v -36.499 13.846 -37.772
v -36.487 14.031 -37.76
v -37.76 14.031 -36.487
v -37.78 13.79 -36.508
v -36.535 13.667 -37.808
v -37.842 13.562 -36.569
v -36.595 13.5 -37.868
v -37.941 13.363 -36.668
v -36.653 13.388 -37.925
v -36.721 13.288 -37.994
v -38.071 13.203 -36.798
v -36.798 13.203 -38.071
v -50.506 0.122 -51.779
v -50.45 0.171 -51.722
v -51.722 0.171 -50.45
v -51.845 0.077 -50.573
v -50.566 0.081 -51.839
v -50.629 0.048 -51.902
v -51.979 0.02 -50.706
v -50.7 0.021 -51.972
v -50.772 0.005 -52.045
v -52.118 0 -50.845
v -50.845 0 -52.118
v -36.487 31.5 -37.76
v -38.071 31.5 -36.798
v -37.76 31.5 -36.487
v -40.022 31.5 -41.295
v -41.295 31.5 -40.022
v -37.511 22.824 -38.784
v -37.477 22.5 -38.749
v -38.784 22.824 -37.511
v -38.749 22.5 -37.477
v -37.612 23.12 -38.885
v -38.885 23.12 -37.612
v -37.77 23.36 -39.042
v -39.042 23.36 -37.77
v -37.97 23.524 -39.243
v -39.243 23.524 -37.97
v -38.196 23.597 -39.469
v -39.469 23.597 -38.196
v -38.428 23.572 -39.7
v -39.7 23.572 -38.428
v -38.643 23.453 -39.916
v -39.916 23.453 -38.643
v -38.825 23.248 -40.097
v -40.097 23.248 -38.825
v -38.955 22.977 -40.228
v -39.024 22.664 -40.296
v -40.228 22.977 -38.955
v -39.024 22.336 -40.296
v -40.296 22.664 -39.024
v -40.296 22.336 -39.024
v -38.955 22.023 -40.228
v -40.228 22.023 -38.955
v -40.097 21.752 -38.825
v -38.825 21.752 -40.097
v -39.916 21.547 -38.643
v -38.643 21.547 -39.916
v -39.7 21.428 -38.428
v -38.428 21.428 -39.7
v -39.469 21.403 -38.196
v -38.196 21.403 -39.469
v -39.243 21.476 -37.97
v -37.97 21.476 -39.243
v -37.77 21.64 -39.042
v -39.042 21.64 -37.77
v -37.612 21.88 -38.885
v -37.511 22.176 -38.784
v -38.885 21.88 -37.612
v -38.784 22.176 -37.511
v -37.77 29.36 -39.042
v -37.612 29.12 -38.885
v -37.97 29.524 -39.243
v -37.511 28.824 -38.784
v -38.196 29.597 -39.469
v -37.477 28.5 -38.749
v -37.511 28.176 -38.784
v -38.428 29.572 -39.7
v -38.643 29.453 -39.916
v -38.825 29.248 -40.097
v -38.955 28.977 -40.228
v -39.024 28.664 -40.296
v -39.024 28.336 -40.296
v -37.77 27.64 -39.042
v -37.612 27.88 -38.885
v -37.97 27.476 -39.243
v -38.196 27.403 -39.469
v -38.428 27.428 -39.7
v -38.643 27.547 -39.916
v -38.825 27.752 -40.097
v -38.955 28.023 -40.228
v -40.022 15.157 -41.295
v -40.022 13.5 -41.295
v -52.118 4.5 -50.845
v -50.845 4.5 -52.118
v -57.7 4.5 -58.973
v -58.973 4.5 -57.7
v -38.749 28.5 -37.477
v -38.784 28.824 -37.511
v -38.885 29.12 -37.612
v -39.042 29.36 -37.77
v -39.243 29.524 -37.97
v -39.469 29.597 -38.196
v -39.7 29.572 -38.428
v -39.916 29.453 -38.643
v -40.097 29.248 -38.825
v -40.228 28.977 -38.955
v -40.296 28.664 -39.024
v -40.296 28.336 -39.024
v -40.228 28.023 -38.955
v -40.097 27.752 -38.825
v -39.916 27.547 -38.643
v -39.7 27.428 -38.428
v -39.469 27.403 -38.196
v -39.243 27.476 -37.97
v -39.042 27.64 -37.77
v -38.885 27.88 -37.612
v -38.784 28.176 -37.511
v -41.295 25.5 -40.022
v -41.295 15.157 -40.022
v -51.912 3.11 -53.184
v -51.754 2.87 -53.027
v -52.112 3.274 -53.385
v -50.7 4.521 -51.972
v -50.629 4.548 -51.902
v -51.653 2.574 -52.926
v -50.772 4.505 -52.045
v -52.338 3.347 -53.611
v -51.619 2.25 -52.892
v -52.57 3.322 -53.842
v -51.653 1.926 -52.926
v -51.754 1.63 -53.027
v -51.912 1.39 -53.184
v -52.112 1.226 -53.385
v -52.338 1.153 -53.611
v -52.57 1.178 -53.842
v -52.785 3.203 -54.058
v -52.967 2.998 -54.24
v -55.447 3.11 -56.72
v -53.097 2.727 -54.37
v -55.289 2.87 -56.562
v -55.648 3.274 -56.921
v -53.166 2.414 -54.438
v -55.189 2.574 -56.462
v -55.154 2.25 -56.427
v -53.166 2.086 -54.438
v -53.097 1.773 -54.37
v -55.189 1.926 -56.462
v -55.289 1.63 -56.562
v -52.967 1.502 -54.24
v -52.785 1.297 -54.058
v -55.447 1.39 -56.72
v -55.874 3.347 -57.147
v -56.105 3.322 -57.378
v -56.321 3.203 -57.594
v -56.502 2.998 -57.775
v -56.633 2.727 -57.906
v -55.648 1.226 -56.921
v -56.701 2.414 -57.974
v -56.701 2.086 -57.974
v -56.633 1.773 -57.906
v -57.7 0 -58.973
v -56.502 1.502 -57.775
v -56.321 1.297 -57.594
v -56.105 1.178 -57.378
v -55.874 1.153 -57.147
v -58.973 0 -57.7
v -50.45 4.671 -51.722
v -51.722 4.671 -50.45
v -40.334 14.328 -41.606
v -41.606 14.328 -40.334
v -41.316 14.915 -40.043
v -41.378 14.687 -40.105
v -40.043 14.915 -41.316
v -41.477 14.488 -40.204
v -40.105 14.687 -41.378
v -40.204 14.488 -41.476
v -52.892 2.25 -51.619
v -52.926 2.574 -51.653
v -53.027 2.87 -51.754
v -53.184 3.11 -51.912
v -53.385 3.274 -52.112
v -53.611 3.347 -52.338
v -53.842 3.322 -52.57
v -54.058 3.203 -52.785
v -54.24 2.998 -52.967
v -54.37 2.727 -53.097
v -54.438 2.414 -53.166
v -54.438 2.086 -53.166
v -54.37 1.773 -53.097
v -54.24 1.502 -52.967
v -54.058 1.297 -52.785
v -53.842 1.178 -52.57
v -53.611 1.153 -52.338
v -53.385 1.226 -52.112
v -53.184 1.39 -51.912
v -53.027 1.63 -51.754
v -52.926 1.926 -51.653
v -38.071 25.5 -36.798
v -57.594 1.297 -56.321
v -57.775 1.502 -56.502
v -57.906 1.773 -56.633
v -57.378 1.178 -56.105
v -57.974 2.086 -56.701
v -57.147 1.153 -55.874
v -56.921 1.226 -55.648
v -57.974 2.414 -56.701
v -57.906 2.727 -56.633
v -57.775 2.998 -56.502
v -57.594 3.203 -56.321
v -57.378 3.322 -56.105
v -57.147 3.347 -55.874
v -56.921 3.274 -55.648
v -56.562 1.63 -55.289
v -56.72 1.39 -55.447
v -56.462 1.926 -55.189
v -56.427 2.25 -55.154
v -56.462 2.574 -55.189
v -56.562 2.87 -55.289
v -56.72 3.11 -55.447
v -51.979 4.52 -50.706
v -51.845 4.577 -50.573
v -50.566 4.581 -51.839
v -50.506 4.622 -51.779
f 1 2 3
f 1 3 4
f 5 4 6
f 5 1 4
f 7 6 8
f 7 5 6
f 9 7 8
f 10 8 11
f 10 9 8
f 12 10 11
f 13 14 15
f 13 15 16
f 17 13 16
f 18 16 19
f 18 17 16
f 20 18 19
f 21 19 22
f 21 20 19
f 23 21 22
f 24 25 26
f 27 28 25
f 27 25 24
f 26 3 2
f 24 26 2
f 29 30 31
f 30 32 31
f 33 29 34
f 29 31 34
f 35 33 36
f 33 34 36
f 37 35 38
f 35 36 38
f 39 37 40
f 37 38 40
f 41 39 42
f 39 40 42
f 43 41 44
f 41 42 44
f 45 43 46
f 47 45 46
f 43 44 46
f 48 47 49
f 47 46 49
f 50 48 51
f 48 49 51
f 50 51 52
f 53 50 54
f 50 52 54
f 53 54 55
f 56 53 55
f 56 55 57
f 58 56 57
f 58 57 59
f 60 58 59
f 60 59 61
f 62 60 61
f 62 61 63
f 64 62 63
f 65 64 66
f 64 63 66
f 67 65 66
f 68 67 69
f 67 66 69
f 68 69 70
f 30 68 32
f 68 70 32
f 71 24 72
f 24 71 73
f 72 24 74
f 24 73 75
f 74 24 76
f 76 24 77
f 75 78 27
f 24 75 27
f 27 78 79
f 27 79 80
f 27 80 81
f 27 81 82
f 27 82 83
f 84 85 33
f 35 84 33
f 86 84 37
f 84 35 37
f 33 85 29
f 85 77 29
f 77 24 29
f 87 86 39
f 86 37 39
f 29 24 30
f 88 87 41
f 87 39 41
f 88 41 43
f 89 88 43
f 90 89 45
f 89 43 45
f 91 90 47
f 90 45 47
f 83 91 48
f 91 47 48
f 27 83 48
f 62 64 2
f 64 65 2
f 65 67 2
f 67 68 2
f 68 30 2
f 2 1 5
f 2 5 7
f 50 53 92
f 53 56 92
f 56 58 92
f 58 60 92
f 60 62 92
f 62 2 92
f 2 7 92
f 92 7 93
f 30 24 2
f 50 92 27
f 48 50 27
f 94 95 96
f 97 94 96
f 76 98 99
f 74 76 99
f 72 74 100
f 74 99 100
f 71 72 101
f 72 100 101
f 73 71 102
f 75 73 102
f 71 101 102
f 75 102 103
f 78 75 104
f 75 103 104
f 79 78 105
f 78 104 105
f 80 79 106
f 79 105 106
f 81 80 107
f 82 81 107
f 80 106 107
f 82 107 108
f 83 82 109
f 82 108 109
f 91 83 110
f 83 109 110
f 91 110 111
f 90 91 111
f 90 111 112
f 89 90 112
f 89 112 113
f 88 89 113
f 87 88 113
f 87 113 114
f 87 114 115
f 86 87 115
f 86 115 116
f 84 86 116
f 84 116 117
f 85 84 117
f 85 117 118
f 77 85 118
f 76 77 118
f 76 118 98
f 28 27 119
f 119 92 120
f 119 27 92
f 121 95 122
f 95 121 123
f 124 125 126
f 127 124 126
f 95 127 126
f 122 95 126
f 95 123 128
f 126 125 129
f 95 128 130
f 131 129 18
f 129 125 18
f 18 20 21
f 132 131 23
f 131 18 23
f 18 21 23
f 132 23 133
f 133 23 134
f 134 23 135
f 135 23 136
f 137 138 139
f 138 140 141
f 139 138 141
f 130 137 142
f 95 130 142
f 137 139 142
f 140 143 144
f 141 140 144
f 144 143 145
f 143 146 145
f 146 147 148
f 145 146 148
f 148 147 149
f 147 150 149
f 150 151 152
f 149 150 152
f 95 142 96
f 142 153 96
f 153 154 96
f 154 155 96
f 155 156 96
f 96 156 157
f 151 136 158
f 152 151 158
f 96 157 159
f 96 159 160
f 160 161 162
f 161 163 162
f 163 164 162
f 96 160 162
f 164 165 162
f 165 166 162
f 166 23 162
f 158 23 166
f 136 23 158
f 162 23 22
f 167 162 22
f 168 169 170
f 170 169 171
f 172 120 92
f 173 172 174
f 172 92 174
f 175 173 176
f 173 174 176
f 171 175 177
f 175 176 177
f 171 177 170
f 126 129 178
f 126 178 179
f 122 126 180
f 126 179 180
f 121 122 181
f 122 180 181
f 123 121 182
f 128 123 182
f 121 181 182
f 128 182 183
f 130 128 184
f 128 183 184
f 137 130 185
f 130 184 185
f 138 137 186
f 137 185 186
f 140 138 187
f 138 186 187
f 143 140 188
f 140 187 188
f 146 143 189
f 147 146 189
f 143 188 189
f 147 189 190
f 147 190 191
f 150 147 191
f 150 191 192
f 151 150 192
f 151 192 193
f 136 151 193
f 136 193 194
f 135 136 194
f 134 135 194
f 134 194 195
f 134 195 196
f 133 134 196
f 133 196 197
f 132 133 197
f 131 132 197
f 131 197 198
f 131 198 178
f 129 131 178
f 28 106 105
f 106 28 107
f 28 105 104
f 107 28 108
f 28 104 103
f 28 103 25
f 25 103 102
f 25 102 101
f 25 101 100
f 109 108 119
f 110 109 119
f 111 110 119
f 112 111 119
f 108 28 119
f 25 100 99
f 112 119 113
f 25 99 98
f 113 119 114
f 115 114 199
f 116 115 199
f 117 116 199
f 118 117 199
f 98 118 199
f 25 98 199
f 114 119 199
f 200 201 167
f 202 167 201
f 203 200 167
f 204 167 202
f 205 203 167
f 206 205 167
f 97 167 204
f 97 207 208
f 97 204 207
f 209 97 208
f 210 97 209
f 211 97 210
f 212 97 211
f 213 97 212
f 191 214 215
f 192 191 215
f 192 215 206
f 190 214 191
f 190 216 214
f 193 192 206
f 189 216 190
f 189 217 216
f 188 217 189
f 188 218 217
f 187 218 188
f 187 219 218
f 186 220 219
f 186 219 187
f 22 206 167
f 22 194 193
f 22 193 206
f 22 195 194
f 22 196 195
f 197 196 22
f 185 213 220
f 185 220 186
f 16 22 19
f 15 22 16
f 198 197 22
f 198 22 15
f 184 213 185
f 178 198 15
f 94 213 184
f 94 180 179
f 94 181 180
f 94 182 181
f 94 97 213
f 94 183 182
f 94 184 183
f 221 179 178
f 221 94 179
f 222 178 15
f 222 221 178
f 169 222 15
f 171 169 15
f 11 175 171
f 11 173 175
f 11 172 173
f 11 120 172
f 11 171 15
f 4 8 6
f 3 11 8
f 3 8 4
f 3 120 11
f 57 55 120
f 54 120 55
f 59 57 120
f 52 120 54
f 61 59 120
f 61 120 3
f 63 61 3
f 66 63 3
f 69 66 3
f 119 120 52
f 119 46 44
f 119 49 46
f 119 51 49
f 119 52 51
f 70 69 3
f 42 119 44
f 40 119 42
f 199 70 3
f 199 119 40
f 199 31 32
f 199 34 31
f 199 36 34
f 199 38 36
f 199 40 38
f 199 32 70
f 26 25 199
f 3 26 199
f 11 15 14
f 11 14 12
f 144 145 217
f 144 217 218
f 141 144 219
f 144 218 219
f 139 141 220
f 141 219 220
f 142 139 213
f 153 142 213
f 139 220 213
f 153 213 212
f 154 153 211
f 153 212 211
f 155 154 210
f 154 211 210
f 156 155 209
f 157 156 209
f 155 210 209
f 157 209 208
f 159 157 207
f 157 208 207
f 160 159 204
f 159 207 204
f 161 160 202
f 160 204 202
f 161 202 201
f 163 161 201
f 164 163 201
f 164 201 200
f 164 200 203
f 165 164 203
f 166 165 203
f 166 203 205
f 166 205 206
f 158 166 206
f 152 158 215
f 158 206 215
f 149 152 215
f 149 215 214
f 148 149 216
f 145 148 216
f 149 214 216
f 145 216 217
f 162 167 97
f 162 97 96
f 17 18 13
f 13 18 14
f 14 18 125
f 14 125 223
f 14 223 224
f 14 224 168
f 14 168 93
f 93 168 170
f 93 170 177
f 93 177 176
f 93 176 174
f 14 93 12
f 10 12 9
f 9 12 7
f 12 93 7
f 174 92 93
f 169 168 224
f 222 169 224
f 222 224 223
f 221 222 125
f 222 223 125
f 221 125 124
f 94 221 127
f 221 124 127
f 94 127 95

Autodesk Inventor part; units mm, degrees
ref_plane "YZ Plane" through (0, 0, 0) normal (1, 0, 0) x (0, 1, 0)
sketch "Sketch3" plane through (0, 0, 0) normal (0, 1, 0) x (-1, 0, 0)
  circle A0 centre (0, 0) radius 110 construction
  arc A1 (43.0581, -98.5) -> (-43.0581, -98.5) centre (0, 0) ccw
  line L0 (0, -107.5) -> (0, -98.5) construction
  line L1 (0, -98.5) -> (0, -73.5) construction
  line L2 (0, -98.5) -> (-43.0581, -98.5) construction
  line L3 (0, -98.5) -> (43.0581, -98.5) construction
  line L4 (43.0581, -98.5) -> (-43.0581, -98.5) construction
  line L5 (-18.0581, -73.5) -> (18.0581, -73.5)
  arc A2 (43.0581, -98.5) -> (18.0581, -73.5) centre (18.0581, -98.5) ccw
  arc A3 (-18.0581, -73.5) -> (-43.0581, -98.5) centre (-18.0581, -98.5) ccw
  line L6 (0, 107.5) -> (0, 97.5) construction
  line L7 (0, 97.5) -> (-22.5, 97.5) construction
  line L8 (-22.5, 97.5) -> (-22.5, 82.5) construction
  line L9 (22.5, 82.5) -> (22.5, 97.5) construction
  line L10 (22.5, 90) -> (-22.5, 90) construction
  line L11 (15, 97.5) -> (-15, 97.5)
  line L12 (-15, 82.5) -> (15, 82.5)
  arc A4 (15, 82.5) -> (15, 97.5) centre (15, 90) ccw
  arc A5 (-15, 97.5) -> (-15, 82.5) centre (-15, 90) ccw
  line L13 (22.5, 82.5) -> (17.5, 82.5) construction
  line L14 (17.5, 82.5) -> (17.5, 77.5) construction
  circle A6 centre (17.5, 77.5) radius 1.6
  circle A7 centre (-17.5, 77.5) radius 1.6
  line L15 (-58.3363, 79.5495) -> (-79.5495, 58.3363)
  arc A8 (-47.7297, 68.9429) -> (-58.3363, 79.5495) centre (-53.033, 74.2462) ccw
  arc A9 (-79.5495, 58.3363) -> (-68.9429, 47.7297) centre (-74.2462, 53.033) ccw
  line L16 (-68.9429, 47.7297) -> (-47.7297, 68.9429)
  circle A10 centre (-67.1751, 42.4264) radius 1.6
  circle A11 centre (-42.4264, 67.1751) radius 1.6
  line L17 (-97.5, 15) -> (-97.5, -15)
  arc A12 (-82.5, 15) -> (-97.5, 15) centre (-90, 15) ccw
  arc A13 (-97.5, -15) -> (-82.5, -15) centre (-90, -15) ccw
  line L18 (-82.5, -15) -> (-82.5, 15)
  circle A14 centre (-77.5, -17.5) radius 1.6
  circle A15 centre (-77.5, 17.5) radius 1.6
  line L19 (-79.5495, -58.3363) -> (-58.3363, -79.5495)
  arc A16 (-68.9429, -47.7297) -> (-79.5495, -58.3363) centre (-74.2462, -53.033) ccw
  arc A17 (-58.3363, -79.5495) -> (-47.7297, -68.9429) centre (-53.033, -74.2462) ccw
  line L20 (-47.7297, -68.9429) -> (-68.9429, -47.7297)
  circle A18 centre (-42.4264, -67.1751) radius 1.6
  circle A19 centre (-67.1751, -42.4264) radius 1.6
  line L21 (-15, -97.5) -> (15, -97.5)
  arc A20 (-15, -82.5) -> (-15, -97.5) centre (-15, -90) ccw
  arc A21 (15, -97.5) -> (15, -82.5) centre (15, -90) ccw
  line L22 (15, -82.5) -> (-15, -82.5)
  circle A22 centre (17.5, -77.5) radius 1.6
  circle A23 centre (-17.5, -77.5) radius 1.6
  line L23 (58.3363, -79.5495) -> (79.5495, -58.3363)
  arc A24 (47.7297, -68.9429) -> (58.3363, -79.5495) centre (53.033, -74.2462) ccw
  arc A25 (79.5495, -58.3363) -> (68.9429, -47.7297) centre (74.2462, -53.033) ccw
  line L24 (68.9429, -47.7297) -> (47.7297, -68.9429)
  circle A26 centre (67.1751, -42.4264) radius 1.6
  circle A27 centre (42.4264, -67.1751) radius 1.6
  line L25 (97.5, -15) -> (97.5, 15)
  arc A28 (82.5, -15) -> (97.5, -15) centre (90, -15) ccw
  arc A29 (97.5, 15) -> (82.5, 15) centre (90, 15) ccw
  line L26 (82.5, 15) -> (82.5, -15)
  circle A30 centre (77.5, 17.5) radius 1.6
  circle A31 centre (77.5, -17.5) radius 1.6
  line L27 (79.5495, 58.3363) -> (58.3363, 79.5495)
  arc A32 (68.9429, 47.7297) -> (79.5495, 58.3363) centre (74.2462, 53.033) ccw
  arc A33 (58.3363, 79.5495) -> (47.7297, 68.9429) centre (53.033, 74.2462) ccw
  line L28 (47.7297, 68.9429) -> (68.9429, 47.7297)
  circle A34 centre (42.4264, 67.1751) radius 1.6
  circle A35 centre (67.1751, 42.4264) radius 1.6
  circle A36 centre (0, 0) radius 110 construction
  arc A37 (43.0581, -98.5) -> (-43.0581, -98.5) centre (0, 0) ccw
  line L29 (0, -107.5) -> (0, -98.5) construction
  line L30 (0, -98.5) -> (0, -73.5) construction
  line L31 (0, -98.5) -> (-43.0581, -98.5) construction
  line L32 (0, -98.5) -> (43.0581, -98.5) construction
  line L33 (43.0581, -98.5) -> (-43.0581, -98.5) construction
  line L34 (-18.0581, -73.5) -> (18.0581, -73.5)
  arc A38 (43.0581, -98.5) -> (18.0581, -73.5) centre (18.0581, -98.5) ccw
  arc A39 (-18.0581, -73.5) -> (-43.0581, -98.5) centre (-18.0581, -98.5) ccw
  line L35 (0, 107.5) -> (0, 97.5) construction
  line L36 (0, 97.5) -> (-22.5, 97.5) construction
  line L37 (-22.5, 97.5) -> (-22.5, 82.5) construction
  line L38 (22.5, 82.5) -> (22.5, 97.5) construction
  line L39 (22.5, 90) -> (-22.5, 90) construction
  line L40 (15, 97.5) -> (-15, 97.5)
  line L41 (-15, 82.5) -> (15, 82.5)
  arc A40 (15, 82.5) -> (15, 97.5) centre (15, 90) ccw
  arc A41 (-15, 97.5) -> (-15, 82.5) centre (-15, 90) ccw
  line L42 (22.5, 82.5) -> (17.5, 82.5) construction
  line L43 (17.5, 82.5) -> (17.5, 77.5) construction
  circle A42 centre (17.5, 77.5) radius 1.6
  circle A43 centre (-17.5, 77.5) radius 1.6
  line L44 (-58.3363, 79.5495) -> (-79.5495, 58.3363)
  arc A44 (-47.7297, 68.9429) -> (-58.3363, 79.5495) centre (-53.033, 74.2462) ccw
  arc A45 (-79.5495, 58.3363) -> (-68.9429, 47.7297) centre (-74.2462, 53.033) ccw
  line L45 (-68.9429, 47.7297) -> (-47.7297, 68.9429)
  circle A46 centre (-67.1751, 42.4264) radius 1.6
  circle A47 centre (-42.4264, 67.1751) radius 1.6
  line L46 (-97.5, 15) -> (-97.5, -15)
  arc A48 (-82.5, 15) -> (-97.5, 15) centre (-90, 15) ccw
  arc A49 (-97.5, -15) -> (-82.5, -15) centre (-90, -15) ccw
  line L47 (-82.5, -15) -> (-82.5, 15)
  circle A50 centre (-77.5, -17.5) radius 1.6
  circle A51 centre (-77.5, 17.5) radius 1.6
  line L48 (-79.5495, -58.3363) -> (-58.3363, -79.5495)
  arc A52 (-68.9429, -47.7297) -> (-79.5495, -58.3363) centre (-74.2462, -53.033) ccw
  arc A53 (-58.3363, -79.5495) -> (-47.7297, -68.9429) centre (-53.033, -74.2462) ccw
  line L49 (-47.7297, -68.9429) -> (-68.9429, -47.7297)
  circle A54 centre (-42.4264, -67.1751) radius 1.6
  circle A55 centre (-67.1751, -42.4264) radius 1.6
  line L50 (-15, -97.5) -> (15, -97.5)
  arc A56 (-15, -82.5) -> (-15, -97.5) centre (-15, -90) ccw
  arc A57 (15, -97.5) -> (15, -82.5) centre (15, -90) ccw
  line L51 (15, -82.5) -> (-15, -82.5)
  circle A58 centre (17.5, -77.5) radius 1.6
  circle A59 centre (-17.5, -77.5) radius 1.6
  line L52 (58.3363, -79.5495) -> (79.5495, -58.3363)
  arc A60 (47.7297, -68.9429) -> (58.3363, -79.5495) centre (53.033, -74.2462) ccw
  arc A61 (79.5495, -58.3363) -> (68.9429, -47.7297) centre (74.2462, -53.033) ccw
  line L53 (68.9429, -47.7297) -> (47.7297, -68.9429)
  circle A62 centre (67.1751, -42.4264) radius 1.6
  circle A63 centre (42.4264, -67.1751) radius 1.6
  line L54 (97.5, -15) -> (97.5, 15)
  arc A64 (82.5, -15) -> (97.5, -15) centre (90, -15) ccw
  arc A65 (97.5, 15) -> (82.5, 15) centre (90, 15) ccw
  line L55 (82.5, 15) -> (82.5, -15)
  circle A66 centre (77.5, 17.5) radius 1.6
  circle A67 centre (77.5, -17.5) radius 1.6
  line L56 (79.5495, 58.3363) -> (58.3363, 79.5495)
  arc A68 (68.9429, 47.7297) -> (79.5495, 58.3363) centre (74.2462, 53.033) ccw
  arc A69 (58.3363, 79.5495) -> (47.7297, 68.9429) centre (53.033, 74.2462) ccw
  line L57 (47.7297, 68.9429) -> (68.9429, 47.7297)
  circle A70 centre (42.4264, 67.1751) radius 1.6
  circle A71 centre (67.1751, 42.4264) radius 1.6
  line L58 (67.1751, -42.4264) -> (54.8008, -54.8008) construction
  line L59 (54.8008, -54.8008) -> (53.3866, -56.215) construction
  line L60 (53.3866, -56.215) -> (52.3259, -57.2756) construction
  line L61 (47.7297, -54.8008) -> (54.8008, -61.8718)
  line L62 (54.8008, -61.8718) -> (56.9221, -59.7505)
  line L63 (56.9221, -59.7505) -> (49.851, -52.6795)
  line L64 (49.851, -52.6795) -> (47.7297, -54.8008)
  line L65 (47.7297, -54.8008) -> (56.9221, -59.7505) construction
  line L66 (54.8008, -61.8718) -> (49.851, -52.6795) construction
  line L67 (54.8008, -54.8008) -> (53.7401, -53.7401) construction
  line L68 (59.7505, -56.9221) -> (52.6795, -49.851)
  line L69 (54.8008, -47.7297) -> (61.8718, -54.8008)
  line L70 (52.6795, -49.851) -> (54.8008, -47.7297)
  line L71 (58.9727, -57.6999) -> (51.9016, -50.6288)
  line L72 (51.9016, -50.6288) -> (50.6288, -51.9016)
  line L73 (50.6288, -51.9016) -> (57.6999, -58.9727)
  line L74 (57.6999, -58.9727) -> (58.9727, -57.6999)
  line L75 (58.9727, -57.6999) -> (50.6288, -51.9016) construction
  line L76 (51.9016, -50.6288) -> (57.6999, -58.9727) construction
  point P0 (0, 90)
  point P1 (-45.9619, 70.7107)
  point P2 (-82.5, 17.5)
  point P3 (-70.7107, -45.9619)
  point P4 (-17.5, -82.5)
  point P5 (45.9619, -70.7107)
  point P6 (82.5, -17.5)
  point P7 (70.7107, 45.9619)
  point P8 (0, 90)
  point P9 (-45.9619, 70.7107)
  point P10 (-82.5, 17.5)
  point P11 (-70.7107, -45.9619)
  point P12 (-17.5, -82.5)
  point P13 (45.9619, -70.7107)
  point P14 (82.5, -17.5)
  point P15 (70.7107, 45.9619)
  point P16 (45.4935, 0)
  point P17 (26.7551, 33.8262)
  point P18 (-26.7551, 33.8262)
  point P19 (-33.8262, 26.7551)
  point P20 (-33.8262, -26.7551)
  point P21 (-26.7551, -33.8262)
  point P22 (26.7551, -33.8262)
  point P23 (33.8262, -26.7551)
  point P24 (33.8262, 26.7551)
  dimension "d9" = 220
  dimension "d10" = 215
  dimension "d11" = 9
  dimension "d12" = 25
  dimension "d13" = 10
  dimension "d14" = 22.5
  dimension "d15" = 15
  dimension "d16" = 45
  dimension "d17" = 5
  dimension "d18" = 5
  dimension "d19" = 3.2
  dimension "d20" = 86.1162
  dimension "d21" = 45
  dimension "d22" = 360
  dimension "d23" = 220
  dimension "d24" = 215
  dimension "d25" = 9
  dimension "d26" = 25
  dimension "d27" = 10
  dimension "d28" = 22.5
  dimension "d29" = 15
  dimension "d30" = 45
  dimension "d31" = 5
  dimension "d32" = 5
  dimension "d33" = 3.2
  dimension "d34" = 86.1162
  dimension "d35" = 45
  dimension "d36" = 360
  dimension "d37" = 17.5
  dimension "d38" = 2
  dimension "d39" = 1.5
  dimension "d40" = 1.8
extrude "Extrusion2" add sketch "Sketch3" along normal blind 4.5 contours L73 L72 L71 L24
sketch "Sketch4" plane through (-51.9016, 0, -50.6288) normal (-0.7071068, 0, 0.7071068) x (0.7071068, 0, 0.7071068)
  line L0 (0, 4.5) -> (-10, 4.5) construction
  line L1 (0, 0) -> (-10, 0) construction
  line L2 (-10, 4.5) -> (0, 0) construction
  line L3 (-5, 2.25) -> (-7.5, 2.25) construction
  line L4 (-10, 0) -> (-10, 4.5) construction
  line L5 (-5, 2.25) -> (-5, 3.2445) construction
  circle A0 centre (-7.5, 2.25) radius 1.1
  circle A1 centre (-2.5, 2.25) radius 1.1
  point P0 (72.5, 0)
  dimension "d43" = 2.5
  dimension "d44" = 2.2
extrude "Extrusion3" cut sketch "Sketch4" against normal blind 4.5
ref_plane "Work Plane2" through (0, 19.5, 0) normal (0, 1, 0) x (1, 0, 0)
sketch "Sketch5" plane through (0, 19.5, 0) normal (0, 1, 0) x (1, 0, 0)
  circle A0 centre (0, 0) radius 110 construction
  arc A1 (43.0581, -98.5) -> (-43.0581, -98.5) centre (0, 0) ccw
  line L0 (0, -107.5) -> (0, -98.5) construction
  line L1 (0, -98.5) -> (0, -73.5) construction
  line L2 (0, -98.5) -> (-43.0581, -98.5) construction
  line L3 (0, -98.5) -> (43.0581, -98.5) construction
  line L4 (43.0581, -98.5) -> (-43.0581, -98.5) construction
  line L5 (-18.0581, -73.5) -> (18.0581, -73.5)
  arc A2 (43.0581, -98.5) -> (18.0581, -73.5) centre (18.0581, -98.5) ccw
  arc A3 (-18.0581, -73.5) -> (-43.0581, -98.5) centre (-18.0581, -98.5) ccw
  line L6 (0, 107.5) -> (0, 97.5) construction
  line L7 (0, 97.5) -> (-22.5, 97.5) construction
  line L8 (-22.5, 97.5) -> (-22.5, 82.5) construction
  line L9 (22.5, 82.5) -> (22.5, 97.5) construction
  line L10 (22.5, 90) -> (-22.5, 90) construction
  line L11 (15, 97.5) -> (-15, 97.5)
  line L12 (-15, 82.5) -> (15, 82.5)
  arc A4 (15, 82.5) -> (15, 97.5) centre (15, 90) ccw
  arc A5 (-15, 97.5) -> (-15, 82.5) centre (-15, 90) ccw
  line L13 (22.5, 82.5) -> (17.5, 82.5) construction
  line L14 (17.5, 82.5) -> (17.5, 77.5) construction
  circle A6 centre (17.5, 77.5) radius 1.6
  circle A7 centre (-17.5, 77.5) radius 1.6
  line L15 (-58.3363, 79.5495) -> (-79.5495, 58.3363)
  arc A8 (-47.7297, 68.9429) -> (-58.3363, 79.5495) centre (-53.033, 74.2462) ccw
  arc A9 (-79.5495, 58.3363) -> (-68.9429, 47.7297) centre (-74.2462, 53.033) ccw
  line L16 (-68.9429, 47.7297) -> (-47.7297, 68.9429)
  circle A10 centre (-67.1751, 42.4264) radius 1.6
  circle A11 centre (-42.4264, 67.1751) radius 1.6
  line L17 (-97.5, 15) -> (-97.5, -15)
  arc A12 (-82.5, 15) -> (-97.5, 15) centre (-90, 15) ccw
  arc A13 (-97.5, -15) -> (-82.5, -15) centre (-90, -15) ccw
  line L18 (-82.5, -15) -> (-82.5, 15)
  circle A14 centre (-77.5, -17.5) radius 1.6
  circle A15 centre (-77.5, 17.5) radius 1.6
  line L19 (-79.5495, -58.3363) -> (-58.3363, -79.5495)
  arc A16 (-68.9429, -47.7297) -> (-79.5495, -58.3363) centre (-74.2462, -53.033) ccw
  arc A17 (-58.3363, -79.5495) -> (-47.7297, -68.9429) centre (-53.033, -74.2462) ccw
  line L20 (-47.7297, -68.9429) -> (-68.9429, -47.7297)
  circle A18 centre (-42.4264, -67.1751) radius 1.6
  circle A19 centre (-67.1751, -42.4264) radius 1.6
  line L21 (-15, -97.5) -> (15, -97.5)
  arc A20 (-15, -82.5) -> (-15, -97.5) centre (-15, -90) ccw
  arc A21 (15, -97.5) -> (15, -82.5) centre (15, -90) ccw
  line L22 (15, -82.5) -> (-15, -82.5)
  circle A22 centre (17.5, -77.5) radius 1.6
  circle A23 centre (-17.5, -77.5) radius 1.6
  line L23 (58.3363, -79.5495) -> (79.5495, -58.3363)
  arc A24 (47.7297, -68.9429) -> (58.3363, -79.5495) centre (53.033, -74.2462) ccw
  arc A25 (79.5495, -58.3363) -> (68.9429, -47.7297) centre (74.2462, -53.033) ccw
  line L24 (68.9429, -47.7297) -> (47.7297, -68.9429)
  circle A26 centre (67.1751, -42.4264) radius 1.6
  circle A27 centre (42.4264, -67.1751) radius 1.6
  line L25 (97.5, -15) -> (97.5, 15)
  arc A28 (82.5, -15) -> (97.5, -15) centre (90, -15) ccw
  arc A29 (97.5, 15) -> (82.5, 15) centre (90, 15) ccw
  line L26 (82.5, 15) -> (82.5, -15)
  circle A30 centre (77.5, 17.5) radius 1.6
  circle A31 centre (77.5, -17.5) radius 1.6
  line L27 (79.5495, 58.3363) -> (58.3363, 79.5495)
  arc A32 (68.9429, 47.7297) -> (79.5495, 58.3363) centre (74.2462, 53.033) ccw
  arc A33 (58.3363, 79.5495) -> (47.7297, 68.9429) centre (53.033, 74.2462) ccw
  line L28 (47.7297, 68.9429) -> (68.9429, 47.7297)
  circle A34 centre (42.4264, 67.1751) radius 1.6
  circle A35 centre (67.1751, 42.4264) radius 1.6
  circle A36 centre (0, 0) radius 110 construction
  arc A37 (43.0581, -98.5) -> (-43.0581, -98.5) centre (0, 0) ccw
  line L29 (0, -107.5) -> (0, -98.5) construction
  line L30 (0, -98.5) -> (0, -73.5) construction
  line L31 (0, -98.5) -> (-43.0581, -98.5) construction
  line L32 (0, -98.5) -> (43.0581, -98.5) construction
  line L33 (43.0581, -98.5) -> (-43.0581, -98.5) construction
  line L34 (-18.0581, -73.5) -> (18.0581, -73.5)
  arc A38 (43.0581, -98.5) -> (18.0581, -73.5) centre (18.0581, -98.5) ccw
  arc A39 (-18.0581, -73.5) -> (-43.0581, -98.5) centre (-18.0581, -98.5) ccw
  line L35 (0, 107.5) -> (0, 97.5) construction
  line L36 (0, 97.5) -> (-22.5, 97.5) construction
  line L37 (-22.5, 97.5) -> (-22.5, 82.5) construction
  line L38 (22.5, 82.5) -> (22.5, 97.5) construction
  line L39 (22.5, 90) -> (-22.5, 90) construction
  line L40 (15, 97.5) -> (-15, 97.5)
  line L41 (-15, 82.5) -> (15, 82.5)
  arc A40 (15, 82.5) -> (15, 97.5) centre (15, 90) ccw
  arc A41 (-15, 97.5) -> (-15, 82.5) centre (-15, 90) ccw
  line L42 (22.5, 82.5) -> (17.5, 82.5) construction
  line L43 (17.5, 82.5) -> (17.5, 77.5) construction
  circle A42 centre (17.5, 77.5) radius 1.6
  circle A43 centre (-17.5, 77.5) radius 1.6
  line L44 (-58.3363, 79.5495) -> (-79.5495, 58.3363)
  arc A44 (-47.7297, 68.9429) -> (-58.3363, 79.5495) centre (-53.033, 74.2462) ccw
  arc A45 (-79.5495, 58.3363) -> (-68.9429, 47.7297) centre (-74.2462, 53.033) ccw
  line L45 (-68.9429, 47.7297) -> (-47.7297, 68.9429)
  circle A46 centre (-67.1751, 42.4264) radius 1.6
  circle A47 centre (-42.4264, 67.1751) radius 1.6
  line L46 (-97.5, 15) -> (-97.5, -15)
  arc A48 (-82.5, 15) -> (-97.5, 15) centre (-90, 15) ccw
  arc A49 (-97.5, -15) -> (-82.5, -15) centre (-90, -15) ccw
  line L47 (-82.5, -15) -> (-82.5, 15)
  circle A50 centre (-77.5, -17.5) radius 1.6
  circle A51 centre (-77.5, 17.5) radius 1.6
  line L48 (-79.5495, -58.3363) -> (-58.3363, -79.5495)
  arc A52 (-68.9429, -47.7297) -> (-79.5495, -58.3363) centre (-74.2462, -53.033) ccw
  arc A53 (-58.3363, -79.5495) -> (-47.7297, -68.9429) centre (-53.033, -74.2462) ccw
  line L49 (-47.7297, -68.9429) -> (-68.9429, -47.7297)
  circle A54 centre (-42.4264, -67.1751) radius 1.6
  circle A55 centre (-67.1751, -42.4264) radius 1.6
  line L50 (-15, -97.5) -> (15, -97.5)
  arc A56 (-15, -82.5) -> (-15, -97.5) centre (-15, -90) ccw
  arc A57 (15, -97.5) -> (15, -82.5) centre (15, -90) ccw
  line L51 (15, -82.5) -> (-15, -82.5)
  circle A58 centre (17.5, -77.5) radius 1.6
  circle A59 centre (-17.5, -77.5) radius 1.6
  line L52 (58.3363, -79.5495) -> (79.5495, -58.3363)
  arc A60 (47.7297, -68.9429) -> (58.3363, -79.5495) centre (53.033, -74.2462) ccw
  arc A61 (79.5495, -58.3363) -> (68.9429, -47.7297) centre (74.2462, -53.033) ccw
  line L53 (68.9429, -47.7297) -> (47.7297, -68.9429)
  circle A62 centre (67.1751, -42.4264) radius 1.6
  circle A63 centre (42.4264, -67.1751) radius 1.6
  line L54 (97.5, -15) -> (97.5, 15)
  arc A64 (82.5, -15) -> (97.5, -15) centre (90, -15) ccw
  arc A65 (97.5, 15) -> (82.5, 15) centre (90, 15) ccw
  line L55 (82.5, 15) -> (82.5, -15)
  circle A66 centre (77.5, 17.5) radius 1.6
  circle A67 centre (77.5, -17.5) radius 1.6
  line L56 (79.5495, 58.3363) -> (58.3363, 79.5495)
  arc A68 (68.9429, 47.7297) -> (79.5495, 58.3363) centre (74.2462, 53.033) ccw
  arc A69 (58.3363, 79.5495) -> (47.7297, 68.9429) centre (53.033, 74.2462) ccw
  line L57 (47.7297, 68.9429) -> (68.9429, 47.7297)
  circle A70 centre (42.4264, 67.1751) radius 1.6
  circle A71 centre (67.1751, 42.4264) radius 1.6
  line L58 (67.1751, -42.4264) -> (54.8008, -54.8008) construction
  line L59 (54.8008, -54.8008) -> (53.3866, -56.215) construction
  line L60 (53.3866, -56.215) -> (52.3259, -57.2756) construction
  line L61 (47.7297, -54.8008) -> (54.8008, -61.8718)
  line L62 (54.8008, -61.8718) -> (56.9221, -59.7505)
  line L63 (56.9221, -59.7505) -> (49.851, -52.6795)
  line L64 (49.851, -52.6795) -> (47.7297, -54.8008)
  line L65 (47.7297, -54.8008) -> (56.9221, -59.7505) construction
  line L66 (54.8008, -61.8718) -> (49.851, -52.6795) construction
  line L67 (54.8008, -54.8008) -> (53.7401, -53.7401) construction
  line L68 (59.7505, -56.9221) -> (52.6795, -49.851)
  line L69 (54.8008, -47.7297) -> (61.8718, -54.8008)
  line L70 (52.6795, -49.851) -> (54.8008, -47.7297)
  circle A72 centre (0, 0) radius 75 construction
  circle A73 centre (0, 0) radius 55 construction
  line L71 (-51.9016, 50.6288) -> (-50.6288, 51.9016) construction
  line L72 (-51.2652, 51.2652) -> (-37.8825, 37.8825) construction
  line L73 (-41.295, 40.0222) -> (-37.7595, 36.4867)
  line L74 (-37.7595, 36.4867) -> (-36.4867, 37.7595)
  line L75 (-36.4867, 37.7595) -> (-40.0222, 41.295)
  line L76 (-40.0222, 41.295) -> (-41.295, 40.0222)
  line L77 (-41.295, 40.0222) -> (-36.4867, 37.7595) construction
  line L78 (-37.7595, 36.4867) -> (-40.0222, 41.295) construction
  point P0 (0, 90)
  point P1 (-45.9619, 70.7107)
  point P2 (-82.5, 17.5)
  point P3 (-70.7107, -45.9619)
  point P4 (-17.5, -82.5)
  point P5 (45.9619, -70.7107)
  point P6 (82.5, -17.5)
  point P7 (70.7107, 45.9619)
  point P8 (0, 90)
  point P9 (-45.9619, 70.7107)
  point P10 (-82.5, 17.5)
  point P11 (-70.7107, -45.9619)
  point P12 (-17.5, -82.5)
  point P13 (45.9619, -70.7107)
  point P14 (82.5, -17.5)
  point P15 (70.7107, 45.9619)
  point P16 (45.4935, 0)
  point P17 (26.7551, 33.8262)
  point P18 (-26.7551, 33.8262)
  point P19 (-33.8262, 26.7551)
  point P20 (-33.8262, -26.7551)
  point P21 (-26.7551, -33.8262)
  point P22 (26.7551, -33.8262)
  point P23 (33.8262, -26.7551)
  point P24 (33.8262, 26.7551)
  point P25 (-38.8909, 38.8909)
  dimension "d84" = 110
  dimension "d52" = 220
  dimension "d53" = 215
  dimension "d54" = 9
  dimension "d55" = 25
  dimension "d56" = 10
  dimension "d57" = 22.5
  dimension "d58" = 15
  dimension "d59" = 45
  dimension "d60" = 5
  dimension "d61" = 5
  dimension "d62" = 3.2
  dimension "d63" = 86.1162
  dimension "d64" = 45
  dimension "d65" = 360
  dimension "d66" = 220
  dimension "d67" = 215
  dimension "d68" = 9
  dimension "d69" = 25
  dimension "d70" = 10
  dimension "d71" = 22.5
  dimension "d72" = 15
  dimension "d73" = 45
  dimension "d74" = 5
  dimension "d75" = 5
  dimension "d76" = 3.2
  dimension "d77" = 86.1162
  dimension "d78" = 45
  dimension "d79" = 360
  dimension "d80" = 17.5
  dimension "d81" = 2
  dimension "d82" = 1.5
  dimension "d83" = 150
  dimension "d85" = 5
extrude "Extrusion4" add sketch "Sketch5" along normal mid plane 12 contours L76 L75 L74 L73
ref_plane "Work Plane4" through (-58.9727, 4.5, -57.6999) normal (-0.7071068, 0, 0.7071068) x (0.7071068, 0, 0.7071068)
sketch "Sketch8" plane through (-58.9727, 4.5, -57.6999) normal (-0.7071068, 0, 0.7071068) x (0.7071068, 0, 0.7071068)
  line L0 (10, 0) -> (0, 0) projected
  line L1 (10, -4.5) -> (0, -4.5) projected
  line L2 (10, 0) -> (10, -4.5)
  line L3 (25, 9) -> (30, 9) projected
  line L4 (30, 9) -> (25, 9)
  line L5 (10, -4.5) -> (30, 9)
  line L6 (10, -4.5) -> (17.9179, -4.5) construction
  line L7 (10, 0) -> (12.3461, 0) construction
  line L8 (10, 0) -> (25, 10.125)
  line L9 (10, 0) -> (30, 0) construction
  line L10 (25, 9) -> (25, 21) projected
  line L11 (25, 10.125) -> (25, 9)
  line L12 (25, 9) -> (30, 9)
  point P0 (82.5, -4.5)
  dimension "d92" = 34.019
  dimension "d94" = 34.019
extrude "Extrusion6" add sketch "Sketch8" against normal blind 1.8
fillet "Fillet1" radius 1 4 edges at (-51.2652, 4.5, -51.2652) (-40.6586, 14.625, -40.6586) (-51.2652, 0, -51.2652) (-37.1231, 13.5, -37.1231)
sketch "Sketch9" plane through (0, 25.5, 0) normal (0, 1, 0) x (1, 0, 0)
  line L0 (-36.4867, 37.7595) -> (-40.0222, 41.295) projected
  line L1 (-36.4867, 37.7595) -> (-37.7595, 36.4867)
  line L2 (-51.7223, 50.4496) -> (-38.071, 36.7982) projected
  line L3 (-37.7595, 36.4867) -> (-41.295, 40.0222)
  line L4 (-41.295, 40.0222) -> (-40.0222, 41.295) projected
  line L5 (-40.0222, 41.295) -> (-41.295, 40.0222)
  line L6 (-41.295, 40.0222) -> (-40.0222, 41.295)
  line L7 (-36.7982, 38.071) -> (-50.4496, 51.7223) projected
  line L8 (-40.0222, 41.295) -> (-36.4867, 37.7595)
  point P0 (0, 0)
extrude "Extrusion7" add sketch "Sketch9" along normal blind 6
sketch "Sketch10" plane through (-58.9727, 0, -57.6999) normal (-0.7071068, 0, 0.7071068) x (0.7071068, 0, 0.7071068)
  line L0 (25, 31.5) -> (30, 31.5) projected
  line L1 (27.5, 31.5) -> (27.5, 28.5) construction
  line L2 (27.5, 28.5) -> (27.5, 22.5) construction
  circle A0 centre (27.5, 28.5) radius 1.1
  circle A1 centre (27.5, 22.5) radius 1.1
  point P0 (82.5, 0)
  dimension "d100" = 3
  dimension "d101" = 6
  dimension "d102" = 2.2
  dimension "d103" = 2.2
extrude "Extrusion8" cut sketch "Sketch10" against normal blind 4
properties part number "CarbonConnectorStab"
